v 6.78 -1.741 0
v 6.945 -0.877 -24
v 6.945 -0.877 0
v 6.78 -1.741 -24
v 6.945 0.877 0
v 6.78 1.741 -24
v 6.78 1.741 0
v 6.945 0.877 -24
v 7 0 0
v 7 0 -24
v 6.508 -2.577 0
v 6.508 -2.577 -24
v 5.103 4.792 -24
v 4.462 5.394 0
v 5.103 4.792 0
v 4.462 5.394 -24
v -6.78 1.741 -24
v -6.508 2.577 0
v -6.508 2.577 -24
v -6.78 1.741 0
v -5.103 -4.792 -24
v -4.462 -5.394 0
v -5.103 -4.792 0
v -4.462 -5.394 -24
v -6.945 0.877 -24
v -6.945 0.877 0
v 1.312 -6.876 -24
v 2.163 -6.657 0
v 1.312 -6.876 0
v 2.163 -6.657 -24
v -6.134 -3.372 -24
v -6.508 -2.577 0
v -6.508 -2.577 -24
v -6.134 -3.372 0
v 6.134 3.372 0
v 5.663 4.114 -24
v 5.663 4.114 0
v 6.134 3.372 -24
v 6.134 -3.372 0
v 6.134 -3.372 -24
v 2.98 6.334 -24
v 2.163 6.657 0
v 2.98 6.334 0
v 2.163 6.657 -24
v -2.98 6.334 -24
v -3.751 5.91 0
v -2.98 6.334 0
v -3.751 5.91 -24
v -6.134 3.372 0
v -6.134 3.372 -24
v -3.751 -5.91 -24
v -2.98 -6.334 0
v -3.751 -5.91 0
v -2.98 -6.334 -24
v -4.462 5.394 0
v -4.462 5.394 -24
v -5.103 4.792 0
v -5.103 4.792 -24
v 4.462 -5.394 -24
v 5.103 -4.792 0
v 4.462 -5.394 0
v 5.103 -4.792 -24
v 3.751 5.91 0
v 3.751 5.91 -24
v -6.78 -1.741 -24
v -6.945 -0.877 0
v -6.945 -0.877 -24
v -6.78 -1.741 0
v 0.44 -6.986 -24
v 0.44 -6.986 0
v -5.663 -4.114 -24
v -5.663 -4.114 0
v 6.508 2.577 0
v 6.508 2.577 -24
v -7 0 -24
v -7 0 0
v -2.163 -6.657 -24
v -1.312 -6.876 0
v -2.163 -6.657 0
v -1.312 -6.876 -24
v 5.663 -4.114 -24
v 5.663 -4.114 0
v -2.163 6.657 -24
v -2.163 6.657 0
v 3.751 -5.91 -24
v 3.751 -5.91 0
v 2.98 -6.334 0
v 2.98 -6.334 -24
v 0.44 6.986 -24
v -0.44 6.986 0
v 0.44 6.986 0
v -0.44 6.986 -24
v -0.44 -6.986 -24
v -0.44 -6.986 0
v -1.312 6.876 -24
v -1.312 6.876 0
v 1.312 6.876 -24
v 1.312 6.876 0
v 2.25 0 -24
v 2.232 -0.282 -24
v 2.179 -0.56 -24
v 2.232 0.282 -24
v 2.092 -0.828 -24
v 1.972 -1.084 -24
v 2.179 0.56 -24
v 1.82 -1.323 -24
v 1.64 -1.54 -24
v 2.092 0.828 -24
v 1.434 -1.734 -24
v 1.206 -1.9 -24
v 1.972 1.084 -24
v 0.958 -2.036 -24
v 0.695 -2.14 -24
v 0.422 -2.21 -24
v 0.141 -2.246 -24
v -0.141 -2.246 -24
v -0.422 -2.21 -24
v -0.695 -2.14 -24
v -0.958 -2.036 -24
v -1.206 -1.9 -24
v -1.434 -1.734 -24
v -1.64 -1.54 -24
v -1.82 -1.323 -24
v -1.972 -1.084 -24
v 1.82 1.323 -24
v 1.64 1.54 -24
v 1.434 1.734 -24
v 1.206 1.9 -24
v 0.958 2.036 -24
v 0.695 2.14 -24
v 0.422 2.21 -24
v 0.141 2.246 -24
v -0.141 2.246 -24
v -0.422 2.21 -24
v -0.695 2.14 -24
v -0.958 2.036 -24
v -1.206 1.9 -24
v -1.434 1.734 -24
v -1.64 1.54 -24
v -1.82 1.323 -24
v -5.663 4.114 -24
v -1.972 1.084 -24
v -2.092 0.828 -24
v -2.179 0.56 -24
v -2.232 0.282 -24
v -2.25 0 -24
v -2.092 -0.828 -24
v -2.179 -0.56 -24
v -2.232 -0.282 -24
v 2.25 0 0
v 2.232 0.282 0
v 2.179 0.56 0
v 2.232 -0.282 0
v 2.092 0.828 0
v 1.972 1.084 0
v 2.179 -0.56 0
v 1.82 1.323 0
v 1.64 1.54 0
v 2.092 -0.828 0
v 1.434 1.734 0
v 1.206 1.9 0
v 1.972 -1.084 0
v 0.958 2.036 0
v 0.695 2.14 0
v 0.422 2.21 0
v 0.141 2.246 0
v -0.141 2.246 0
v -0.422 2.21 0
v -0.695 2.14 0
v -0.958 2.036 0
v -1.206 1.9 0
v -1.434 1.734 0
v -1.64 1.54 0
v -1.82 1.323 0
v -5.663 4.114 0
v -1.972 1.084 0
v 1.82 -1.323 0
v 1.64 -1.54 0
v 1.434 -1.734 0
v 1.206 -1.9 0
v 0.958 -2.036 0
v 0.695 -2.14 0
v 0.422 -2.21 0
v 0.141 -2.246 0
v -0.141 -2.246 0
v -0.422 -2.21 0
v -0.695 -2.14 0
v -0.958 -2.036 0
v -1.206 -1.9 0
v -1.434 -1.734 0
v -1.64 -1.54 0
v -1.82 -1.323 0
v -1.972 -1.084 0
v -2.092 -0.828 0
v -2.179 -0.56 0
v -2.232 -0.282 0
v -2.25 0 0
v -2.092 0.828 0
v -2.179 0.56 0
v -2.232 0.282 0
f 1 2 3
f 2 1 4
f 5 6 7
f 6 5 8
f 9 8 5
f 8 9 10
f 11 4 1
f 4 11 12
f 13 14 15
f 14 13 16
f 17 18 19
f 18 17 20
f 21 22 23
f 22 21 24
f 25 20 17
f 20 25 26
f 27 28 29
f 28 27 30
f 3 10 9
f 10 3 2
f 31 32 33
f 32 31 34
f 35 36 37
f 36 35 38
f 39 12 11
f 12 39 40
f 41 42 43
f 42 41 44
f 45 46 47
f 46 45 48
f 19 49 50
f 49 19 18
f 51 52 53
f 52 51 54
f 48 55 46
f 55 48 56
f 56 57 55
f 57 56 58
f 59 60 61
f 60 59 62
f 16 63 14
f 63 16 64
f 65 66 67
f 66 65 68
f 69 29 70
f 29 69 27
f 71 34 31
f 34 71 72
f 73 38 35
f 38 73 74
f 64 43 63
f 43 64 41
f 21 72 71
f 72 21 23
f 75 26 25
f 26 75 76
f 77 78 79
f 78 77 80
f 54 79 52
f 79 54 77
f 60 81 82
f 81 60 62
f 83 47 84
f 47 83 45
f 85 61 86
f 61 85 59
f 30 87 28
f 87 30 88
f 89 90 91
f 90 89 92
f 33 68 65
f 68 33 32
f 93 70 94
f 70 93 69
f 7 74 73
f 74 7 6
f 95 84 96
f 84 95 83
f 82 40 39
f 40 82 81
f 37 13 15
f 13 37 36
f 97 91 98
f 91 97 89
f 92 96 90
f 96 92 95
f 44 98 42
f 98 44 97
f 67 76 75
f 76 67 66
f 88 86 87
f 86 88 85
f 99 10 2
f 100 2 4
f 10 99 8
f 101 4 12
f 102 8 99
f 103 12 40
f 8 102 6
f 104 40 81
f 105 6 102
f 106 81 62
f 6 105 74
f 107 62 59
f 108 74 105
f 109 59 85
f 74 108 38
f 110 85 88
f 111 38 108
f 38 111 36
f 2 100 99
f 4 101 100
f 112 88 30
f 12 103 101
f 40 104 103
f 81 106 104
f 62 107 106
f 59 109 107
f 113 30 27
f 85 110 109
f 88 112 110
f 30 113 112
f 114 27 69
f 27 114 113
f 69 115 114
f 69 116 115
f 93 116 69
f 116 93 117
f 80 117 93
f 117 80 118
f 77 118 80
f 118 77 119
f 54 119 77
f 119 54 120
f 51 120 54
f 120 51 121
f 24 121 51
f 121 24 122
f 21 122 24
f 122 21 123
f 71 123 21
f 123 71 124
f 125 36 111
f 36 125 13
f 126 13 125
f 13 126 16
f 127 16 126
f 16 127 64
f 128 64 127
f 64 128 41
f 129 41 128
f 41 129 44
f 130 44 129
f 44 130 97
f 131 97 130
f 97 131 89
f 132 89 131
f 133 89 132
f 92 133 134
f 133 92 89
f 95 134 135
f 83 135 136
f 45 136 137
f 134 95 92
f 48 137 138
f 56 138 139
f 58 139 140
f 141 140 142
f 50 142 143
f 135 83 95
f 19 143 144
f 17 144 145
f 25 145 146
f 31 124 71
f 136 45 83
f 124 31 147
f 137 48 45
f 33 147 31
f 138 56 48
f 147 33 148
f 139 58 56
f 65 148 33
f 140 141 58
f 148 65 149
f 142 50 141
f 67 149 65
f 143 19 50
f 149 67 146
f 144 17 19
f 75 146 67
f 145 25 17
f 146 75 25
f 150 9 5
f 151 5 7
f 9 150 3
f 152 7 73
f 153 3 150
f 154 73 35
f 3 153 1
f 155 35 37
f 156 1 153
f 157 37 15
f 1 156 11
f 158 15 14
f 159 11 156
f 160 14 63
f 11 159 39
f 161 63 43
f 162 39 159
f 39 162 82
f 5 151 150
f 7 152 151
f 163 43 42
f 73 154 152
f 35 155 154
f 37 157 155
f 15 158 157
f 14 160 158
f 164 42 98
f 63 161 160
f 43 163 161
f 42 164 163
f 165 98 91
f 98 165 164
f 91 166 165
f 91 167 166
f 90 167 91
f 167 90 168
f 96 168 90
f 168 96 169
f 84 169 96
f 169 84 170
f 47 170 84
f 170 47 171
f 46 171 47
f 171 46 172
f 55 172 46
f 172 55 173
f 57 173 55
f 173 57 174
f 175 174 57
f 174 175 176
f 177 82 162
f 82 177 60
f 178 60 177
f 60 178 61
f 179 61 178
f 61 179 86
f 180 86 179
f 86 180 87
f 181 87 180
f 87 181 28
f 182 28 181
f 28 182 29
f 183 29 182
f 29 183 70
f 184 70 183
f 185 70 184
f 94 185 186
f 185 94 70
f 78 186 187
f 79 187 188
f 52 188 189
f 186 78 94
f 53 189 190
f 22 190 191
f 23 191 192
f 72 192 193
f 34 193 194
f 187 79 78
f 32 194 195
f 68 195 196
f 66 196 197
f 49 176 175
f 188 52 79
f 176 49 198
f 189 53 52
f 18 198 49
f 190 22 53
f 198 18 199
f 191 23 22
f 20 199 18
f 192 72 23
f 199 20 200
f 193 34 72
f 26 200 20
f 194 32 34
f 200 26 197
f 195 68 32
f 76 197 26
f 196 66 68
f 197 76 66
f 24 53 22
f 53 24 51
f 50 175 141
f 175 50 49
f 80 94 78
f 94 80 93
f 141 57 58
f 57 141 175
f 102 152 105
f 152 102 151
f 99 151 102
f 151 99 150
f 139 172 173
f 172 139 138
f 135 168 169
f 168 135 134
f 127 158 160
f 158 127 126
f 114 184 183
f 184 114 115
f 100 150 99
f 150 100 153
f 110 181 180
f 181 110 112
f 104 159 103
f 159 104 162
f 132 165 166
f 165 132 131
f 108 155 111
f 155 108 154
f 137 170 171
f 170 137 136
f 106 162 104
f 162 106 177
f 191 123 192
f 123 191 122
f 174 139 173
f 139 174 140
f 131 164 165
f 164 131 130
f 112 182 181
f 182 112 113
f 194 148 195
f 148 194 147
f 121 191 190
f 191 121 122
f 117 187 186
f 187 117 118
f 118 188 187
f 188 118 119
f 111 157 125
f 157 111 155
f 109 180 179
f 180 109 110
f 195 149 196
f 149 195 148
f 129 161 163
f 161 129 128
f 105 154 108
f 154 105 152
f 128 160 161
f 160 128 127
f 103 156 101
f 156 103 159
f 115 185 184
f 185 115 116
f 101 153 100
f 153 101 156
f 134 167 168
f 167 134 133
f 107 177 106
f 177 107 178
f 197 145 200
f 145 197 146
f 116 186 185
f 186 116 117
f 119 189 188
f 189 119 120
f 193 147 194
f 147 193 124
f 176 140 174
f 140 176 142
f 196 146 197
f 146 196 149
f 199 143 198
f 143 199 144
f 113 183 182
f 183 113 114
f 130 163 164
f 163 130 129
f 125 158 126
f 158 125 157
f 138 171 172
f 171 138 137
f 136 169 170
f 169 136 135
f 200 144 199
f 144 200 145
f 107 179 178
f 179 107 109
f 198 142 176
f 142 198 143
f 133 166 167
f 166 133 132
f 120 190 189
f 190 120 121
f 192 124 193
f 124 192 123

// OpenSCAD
$fn = 50;


difference() {
	union() {
		translate(v = [0, 0, -24.0000000000]) {
			cylinder(h = 24, r = 7.0000000000);
		}
		cylinder(h = 0, r = 13.0000000000);
	}
	union() {
		#translate(v = [0, 0, -24]) {
			cylinder(h = 24, r = 2.2500000000);
		}
	}
}
